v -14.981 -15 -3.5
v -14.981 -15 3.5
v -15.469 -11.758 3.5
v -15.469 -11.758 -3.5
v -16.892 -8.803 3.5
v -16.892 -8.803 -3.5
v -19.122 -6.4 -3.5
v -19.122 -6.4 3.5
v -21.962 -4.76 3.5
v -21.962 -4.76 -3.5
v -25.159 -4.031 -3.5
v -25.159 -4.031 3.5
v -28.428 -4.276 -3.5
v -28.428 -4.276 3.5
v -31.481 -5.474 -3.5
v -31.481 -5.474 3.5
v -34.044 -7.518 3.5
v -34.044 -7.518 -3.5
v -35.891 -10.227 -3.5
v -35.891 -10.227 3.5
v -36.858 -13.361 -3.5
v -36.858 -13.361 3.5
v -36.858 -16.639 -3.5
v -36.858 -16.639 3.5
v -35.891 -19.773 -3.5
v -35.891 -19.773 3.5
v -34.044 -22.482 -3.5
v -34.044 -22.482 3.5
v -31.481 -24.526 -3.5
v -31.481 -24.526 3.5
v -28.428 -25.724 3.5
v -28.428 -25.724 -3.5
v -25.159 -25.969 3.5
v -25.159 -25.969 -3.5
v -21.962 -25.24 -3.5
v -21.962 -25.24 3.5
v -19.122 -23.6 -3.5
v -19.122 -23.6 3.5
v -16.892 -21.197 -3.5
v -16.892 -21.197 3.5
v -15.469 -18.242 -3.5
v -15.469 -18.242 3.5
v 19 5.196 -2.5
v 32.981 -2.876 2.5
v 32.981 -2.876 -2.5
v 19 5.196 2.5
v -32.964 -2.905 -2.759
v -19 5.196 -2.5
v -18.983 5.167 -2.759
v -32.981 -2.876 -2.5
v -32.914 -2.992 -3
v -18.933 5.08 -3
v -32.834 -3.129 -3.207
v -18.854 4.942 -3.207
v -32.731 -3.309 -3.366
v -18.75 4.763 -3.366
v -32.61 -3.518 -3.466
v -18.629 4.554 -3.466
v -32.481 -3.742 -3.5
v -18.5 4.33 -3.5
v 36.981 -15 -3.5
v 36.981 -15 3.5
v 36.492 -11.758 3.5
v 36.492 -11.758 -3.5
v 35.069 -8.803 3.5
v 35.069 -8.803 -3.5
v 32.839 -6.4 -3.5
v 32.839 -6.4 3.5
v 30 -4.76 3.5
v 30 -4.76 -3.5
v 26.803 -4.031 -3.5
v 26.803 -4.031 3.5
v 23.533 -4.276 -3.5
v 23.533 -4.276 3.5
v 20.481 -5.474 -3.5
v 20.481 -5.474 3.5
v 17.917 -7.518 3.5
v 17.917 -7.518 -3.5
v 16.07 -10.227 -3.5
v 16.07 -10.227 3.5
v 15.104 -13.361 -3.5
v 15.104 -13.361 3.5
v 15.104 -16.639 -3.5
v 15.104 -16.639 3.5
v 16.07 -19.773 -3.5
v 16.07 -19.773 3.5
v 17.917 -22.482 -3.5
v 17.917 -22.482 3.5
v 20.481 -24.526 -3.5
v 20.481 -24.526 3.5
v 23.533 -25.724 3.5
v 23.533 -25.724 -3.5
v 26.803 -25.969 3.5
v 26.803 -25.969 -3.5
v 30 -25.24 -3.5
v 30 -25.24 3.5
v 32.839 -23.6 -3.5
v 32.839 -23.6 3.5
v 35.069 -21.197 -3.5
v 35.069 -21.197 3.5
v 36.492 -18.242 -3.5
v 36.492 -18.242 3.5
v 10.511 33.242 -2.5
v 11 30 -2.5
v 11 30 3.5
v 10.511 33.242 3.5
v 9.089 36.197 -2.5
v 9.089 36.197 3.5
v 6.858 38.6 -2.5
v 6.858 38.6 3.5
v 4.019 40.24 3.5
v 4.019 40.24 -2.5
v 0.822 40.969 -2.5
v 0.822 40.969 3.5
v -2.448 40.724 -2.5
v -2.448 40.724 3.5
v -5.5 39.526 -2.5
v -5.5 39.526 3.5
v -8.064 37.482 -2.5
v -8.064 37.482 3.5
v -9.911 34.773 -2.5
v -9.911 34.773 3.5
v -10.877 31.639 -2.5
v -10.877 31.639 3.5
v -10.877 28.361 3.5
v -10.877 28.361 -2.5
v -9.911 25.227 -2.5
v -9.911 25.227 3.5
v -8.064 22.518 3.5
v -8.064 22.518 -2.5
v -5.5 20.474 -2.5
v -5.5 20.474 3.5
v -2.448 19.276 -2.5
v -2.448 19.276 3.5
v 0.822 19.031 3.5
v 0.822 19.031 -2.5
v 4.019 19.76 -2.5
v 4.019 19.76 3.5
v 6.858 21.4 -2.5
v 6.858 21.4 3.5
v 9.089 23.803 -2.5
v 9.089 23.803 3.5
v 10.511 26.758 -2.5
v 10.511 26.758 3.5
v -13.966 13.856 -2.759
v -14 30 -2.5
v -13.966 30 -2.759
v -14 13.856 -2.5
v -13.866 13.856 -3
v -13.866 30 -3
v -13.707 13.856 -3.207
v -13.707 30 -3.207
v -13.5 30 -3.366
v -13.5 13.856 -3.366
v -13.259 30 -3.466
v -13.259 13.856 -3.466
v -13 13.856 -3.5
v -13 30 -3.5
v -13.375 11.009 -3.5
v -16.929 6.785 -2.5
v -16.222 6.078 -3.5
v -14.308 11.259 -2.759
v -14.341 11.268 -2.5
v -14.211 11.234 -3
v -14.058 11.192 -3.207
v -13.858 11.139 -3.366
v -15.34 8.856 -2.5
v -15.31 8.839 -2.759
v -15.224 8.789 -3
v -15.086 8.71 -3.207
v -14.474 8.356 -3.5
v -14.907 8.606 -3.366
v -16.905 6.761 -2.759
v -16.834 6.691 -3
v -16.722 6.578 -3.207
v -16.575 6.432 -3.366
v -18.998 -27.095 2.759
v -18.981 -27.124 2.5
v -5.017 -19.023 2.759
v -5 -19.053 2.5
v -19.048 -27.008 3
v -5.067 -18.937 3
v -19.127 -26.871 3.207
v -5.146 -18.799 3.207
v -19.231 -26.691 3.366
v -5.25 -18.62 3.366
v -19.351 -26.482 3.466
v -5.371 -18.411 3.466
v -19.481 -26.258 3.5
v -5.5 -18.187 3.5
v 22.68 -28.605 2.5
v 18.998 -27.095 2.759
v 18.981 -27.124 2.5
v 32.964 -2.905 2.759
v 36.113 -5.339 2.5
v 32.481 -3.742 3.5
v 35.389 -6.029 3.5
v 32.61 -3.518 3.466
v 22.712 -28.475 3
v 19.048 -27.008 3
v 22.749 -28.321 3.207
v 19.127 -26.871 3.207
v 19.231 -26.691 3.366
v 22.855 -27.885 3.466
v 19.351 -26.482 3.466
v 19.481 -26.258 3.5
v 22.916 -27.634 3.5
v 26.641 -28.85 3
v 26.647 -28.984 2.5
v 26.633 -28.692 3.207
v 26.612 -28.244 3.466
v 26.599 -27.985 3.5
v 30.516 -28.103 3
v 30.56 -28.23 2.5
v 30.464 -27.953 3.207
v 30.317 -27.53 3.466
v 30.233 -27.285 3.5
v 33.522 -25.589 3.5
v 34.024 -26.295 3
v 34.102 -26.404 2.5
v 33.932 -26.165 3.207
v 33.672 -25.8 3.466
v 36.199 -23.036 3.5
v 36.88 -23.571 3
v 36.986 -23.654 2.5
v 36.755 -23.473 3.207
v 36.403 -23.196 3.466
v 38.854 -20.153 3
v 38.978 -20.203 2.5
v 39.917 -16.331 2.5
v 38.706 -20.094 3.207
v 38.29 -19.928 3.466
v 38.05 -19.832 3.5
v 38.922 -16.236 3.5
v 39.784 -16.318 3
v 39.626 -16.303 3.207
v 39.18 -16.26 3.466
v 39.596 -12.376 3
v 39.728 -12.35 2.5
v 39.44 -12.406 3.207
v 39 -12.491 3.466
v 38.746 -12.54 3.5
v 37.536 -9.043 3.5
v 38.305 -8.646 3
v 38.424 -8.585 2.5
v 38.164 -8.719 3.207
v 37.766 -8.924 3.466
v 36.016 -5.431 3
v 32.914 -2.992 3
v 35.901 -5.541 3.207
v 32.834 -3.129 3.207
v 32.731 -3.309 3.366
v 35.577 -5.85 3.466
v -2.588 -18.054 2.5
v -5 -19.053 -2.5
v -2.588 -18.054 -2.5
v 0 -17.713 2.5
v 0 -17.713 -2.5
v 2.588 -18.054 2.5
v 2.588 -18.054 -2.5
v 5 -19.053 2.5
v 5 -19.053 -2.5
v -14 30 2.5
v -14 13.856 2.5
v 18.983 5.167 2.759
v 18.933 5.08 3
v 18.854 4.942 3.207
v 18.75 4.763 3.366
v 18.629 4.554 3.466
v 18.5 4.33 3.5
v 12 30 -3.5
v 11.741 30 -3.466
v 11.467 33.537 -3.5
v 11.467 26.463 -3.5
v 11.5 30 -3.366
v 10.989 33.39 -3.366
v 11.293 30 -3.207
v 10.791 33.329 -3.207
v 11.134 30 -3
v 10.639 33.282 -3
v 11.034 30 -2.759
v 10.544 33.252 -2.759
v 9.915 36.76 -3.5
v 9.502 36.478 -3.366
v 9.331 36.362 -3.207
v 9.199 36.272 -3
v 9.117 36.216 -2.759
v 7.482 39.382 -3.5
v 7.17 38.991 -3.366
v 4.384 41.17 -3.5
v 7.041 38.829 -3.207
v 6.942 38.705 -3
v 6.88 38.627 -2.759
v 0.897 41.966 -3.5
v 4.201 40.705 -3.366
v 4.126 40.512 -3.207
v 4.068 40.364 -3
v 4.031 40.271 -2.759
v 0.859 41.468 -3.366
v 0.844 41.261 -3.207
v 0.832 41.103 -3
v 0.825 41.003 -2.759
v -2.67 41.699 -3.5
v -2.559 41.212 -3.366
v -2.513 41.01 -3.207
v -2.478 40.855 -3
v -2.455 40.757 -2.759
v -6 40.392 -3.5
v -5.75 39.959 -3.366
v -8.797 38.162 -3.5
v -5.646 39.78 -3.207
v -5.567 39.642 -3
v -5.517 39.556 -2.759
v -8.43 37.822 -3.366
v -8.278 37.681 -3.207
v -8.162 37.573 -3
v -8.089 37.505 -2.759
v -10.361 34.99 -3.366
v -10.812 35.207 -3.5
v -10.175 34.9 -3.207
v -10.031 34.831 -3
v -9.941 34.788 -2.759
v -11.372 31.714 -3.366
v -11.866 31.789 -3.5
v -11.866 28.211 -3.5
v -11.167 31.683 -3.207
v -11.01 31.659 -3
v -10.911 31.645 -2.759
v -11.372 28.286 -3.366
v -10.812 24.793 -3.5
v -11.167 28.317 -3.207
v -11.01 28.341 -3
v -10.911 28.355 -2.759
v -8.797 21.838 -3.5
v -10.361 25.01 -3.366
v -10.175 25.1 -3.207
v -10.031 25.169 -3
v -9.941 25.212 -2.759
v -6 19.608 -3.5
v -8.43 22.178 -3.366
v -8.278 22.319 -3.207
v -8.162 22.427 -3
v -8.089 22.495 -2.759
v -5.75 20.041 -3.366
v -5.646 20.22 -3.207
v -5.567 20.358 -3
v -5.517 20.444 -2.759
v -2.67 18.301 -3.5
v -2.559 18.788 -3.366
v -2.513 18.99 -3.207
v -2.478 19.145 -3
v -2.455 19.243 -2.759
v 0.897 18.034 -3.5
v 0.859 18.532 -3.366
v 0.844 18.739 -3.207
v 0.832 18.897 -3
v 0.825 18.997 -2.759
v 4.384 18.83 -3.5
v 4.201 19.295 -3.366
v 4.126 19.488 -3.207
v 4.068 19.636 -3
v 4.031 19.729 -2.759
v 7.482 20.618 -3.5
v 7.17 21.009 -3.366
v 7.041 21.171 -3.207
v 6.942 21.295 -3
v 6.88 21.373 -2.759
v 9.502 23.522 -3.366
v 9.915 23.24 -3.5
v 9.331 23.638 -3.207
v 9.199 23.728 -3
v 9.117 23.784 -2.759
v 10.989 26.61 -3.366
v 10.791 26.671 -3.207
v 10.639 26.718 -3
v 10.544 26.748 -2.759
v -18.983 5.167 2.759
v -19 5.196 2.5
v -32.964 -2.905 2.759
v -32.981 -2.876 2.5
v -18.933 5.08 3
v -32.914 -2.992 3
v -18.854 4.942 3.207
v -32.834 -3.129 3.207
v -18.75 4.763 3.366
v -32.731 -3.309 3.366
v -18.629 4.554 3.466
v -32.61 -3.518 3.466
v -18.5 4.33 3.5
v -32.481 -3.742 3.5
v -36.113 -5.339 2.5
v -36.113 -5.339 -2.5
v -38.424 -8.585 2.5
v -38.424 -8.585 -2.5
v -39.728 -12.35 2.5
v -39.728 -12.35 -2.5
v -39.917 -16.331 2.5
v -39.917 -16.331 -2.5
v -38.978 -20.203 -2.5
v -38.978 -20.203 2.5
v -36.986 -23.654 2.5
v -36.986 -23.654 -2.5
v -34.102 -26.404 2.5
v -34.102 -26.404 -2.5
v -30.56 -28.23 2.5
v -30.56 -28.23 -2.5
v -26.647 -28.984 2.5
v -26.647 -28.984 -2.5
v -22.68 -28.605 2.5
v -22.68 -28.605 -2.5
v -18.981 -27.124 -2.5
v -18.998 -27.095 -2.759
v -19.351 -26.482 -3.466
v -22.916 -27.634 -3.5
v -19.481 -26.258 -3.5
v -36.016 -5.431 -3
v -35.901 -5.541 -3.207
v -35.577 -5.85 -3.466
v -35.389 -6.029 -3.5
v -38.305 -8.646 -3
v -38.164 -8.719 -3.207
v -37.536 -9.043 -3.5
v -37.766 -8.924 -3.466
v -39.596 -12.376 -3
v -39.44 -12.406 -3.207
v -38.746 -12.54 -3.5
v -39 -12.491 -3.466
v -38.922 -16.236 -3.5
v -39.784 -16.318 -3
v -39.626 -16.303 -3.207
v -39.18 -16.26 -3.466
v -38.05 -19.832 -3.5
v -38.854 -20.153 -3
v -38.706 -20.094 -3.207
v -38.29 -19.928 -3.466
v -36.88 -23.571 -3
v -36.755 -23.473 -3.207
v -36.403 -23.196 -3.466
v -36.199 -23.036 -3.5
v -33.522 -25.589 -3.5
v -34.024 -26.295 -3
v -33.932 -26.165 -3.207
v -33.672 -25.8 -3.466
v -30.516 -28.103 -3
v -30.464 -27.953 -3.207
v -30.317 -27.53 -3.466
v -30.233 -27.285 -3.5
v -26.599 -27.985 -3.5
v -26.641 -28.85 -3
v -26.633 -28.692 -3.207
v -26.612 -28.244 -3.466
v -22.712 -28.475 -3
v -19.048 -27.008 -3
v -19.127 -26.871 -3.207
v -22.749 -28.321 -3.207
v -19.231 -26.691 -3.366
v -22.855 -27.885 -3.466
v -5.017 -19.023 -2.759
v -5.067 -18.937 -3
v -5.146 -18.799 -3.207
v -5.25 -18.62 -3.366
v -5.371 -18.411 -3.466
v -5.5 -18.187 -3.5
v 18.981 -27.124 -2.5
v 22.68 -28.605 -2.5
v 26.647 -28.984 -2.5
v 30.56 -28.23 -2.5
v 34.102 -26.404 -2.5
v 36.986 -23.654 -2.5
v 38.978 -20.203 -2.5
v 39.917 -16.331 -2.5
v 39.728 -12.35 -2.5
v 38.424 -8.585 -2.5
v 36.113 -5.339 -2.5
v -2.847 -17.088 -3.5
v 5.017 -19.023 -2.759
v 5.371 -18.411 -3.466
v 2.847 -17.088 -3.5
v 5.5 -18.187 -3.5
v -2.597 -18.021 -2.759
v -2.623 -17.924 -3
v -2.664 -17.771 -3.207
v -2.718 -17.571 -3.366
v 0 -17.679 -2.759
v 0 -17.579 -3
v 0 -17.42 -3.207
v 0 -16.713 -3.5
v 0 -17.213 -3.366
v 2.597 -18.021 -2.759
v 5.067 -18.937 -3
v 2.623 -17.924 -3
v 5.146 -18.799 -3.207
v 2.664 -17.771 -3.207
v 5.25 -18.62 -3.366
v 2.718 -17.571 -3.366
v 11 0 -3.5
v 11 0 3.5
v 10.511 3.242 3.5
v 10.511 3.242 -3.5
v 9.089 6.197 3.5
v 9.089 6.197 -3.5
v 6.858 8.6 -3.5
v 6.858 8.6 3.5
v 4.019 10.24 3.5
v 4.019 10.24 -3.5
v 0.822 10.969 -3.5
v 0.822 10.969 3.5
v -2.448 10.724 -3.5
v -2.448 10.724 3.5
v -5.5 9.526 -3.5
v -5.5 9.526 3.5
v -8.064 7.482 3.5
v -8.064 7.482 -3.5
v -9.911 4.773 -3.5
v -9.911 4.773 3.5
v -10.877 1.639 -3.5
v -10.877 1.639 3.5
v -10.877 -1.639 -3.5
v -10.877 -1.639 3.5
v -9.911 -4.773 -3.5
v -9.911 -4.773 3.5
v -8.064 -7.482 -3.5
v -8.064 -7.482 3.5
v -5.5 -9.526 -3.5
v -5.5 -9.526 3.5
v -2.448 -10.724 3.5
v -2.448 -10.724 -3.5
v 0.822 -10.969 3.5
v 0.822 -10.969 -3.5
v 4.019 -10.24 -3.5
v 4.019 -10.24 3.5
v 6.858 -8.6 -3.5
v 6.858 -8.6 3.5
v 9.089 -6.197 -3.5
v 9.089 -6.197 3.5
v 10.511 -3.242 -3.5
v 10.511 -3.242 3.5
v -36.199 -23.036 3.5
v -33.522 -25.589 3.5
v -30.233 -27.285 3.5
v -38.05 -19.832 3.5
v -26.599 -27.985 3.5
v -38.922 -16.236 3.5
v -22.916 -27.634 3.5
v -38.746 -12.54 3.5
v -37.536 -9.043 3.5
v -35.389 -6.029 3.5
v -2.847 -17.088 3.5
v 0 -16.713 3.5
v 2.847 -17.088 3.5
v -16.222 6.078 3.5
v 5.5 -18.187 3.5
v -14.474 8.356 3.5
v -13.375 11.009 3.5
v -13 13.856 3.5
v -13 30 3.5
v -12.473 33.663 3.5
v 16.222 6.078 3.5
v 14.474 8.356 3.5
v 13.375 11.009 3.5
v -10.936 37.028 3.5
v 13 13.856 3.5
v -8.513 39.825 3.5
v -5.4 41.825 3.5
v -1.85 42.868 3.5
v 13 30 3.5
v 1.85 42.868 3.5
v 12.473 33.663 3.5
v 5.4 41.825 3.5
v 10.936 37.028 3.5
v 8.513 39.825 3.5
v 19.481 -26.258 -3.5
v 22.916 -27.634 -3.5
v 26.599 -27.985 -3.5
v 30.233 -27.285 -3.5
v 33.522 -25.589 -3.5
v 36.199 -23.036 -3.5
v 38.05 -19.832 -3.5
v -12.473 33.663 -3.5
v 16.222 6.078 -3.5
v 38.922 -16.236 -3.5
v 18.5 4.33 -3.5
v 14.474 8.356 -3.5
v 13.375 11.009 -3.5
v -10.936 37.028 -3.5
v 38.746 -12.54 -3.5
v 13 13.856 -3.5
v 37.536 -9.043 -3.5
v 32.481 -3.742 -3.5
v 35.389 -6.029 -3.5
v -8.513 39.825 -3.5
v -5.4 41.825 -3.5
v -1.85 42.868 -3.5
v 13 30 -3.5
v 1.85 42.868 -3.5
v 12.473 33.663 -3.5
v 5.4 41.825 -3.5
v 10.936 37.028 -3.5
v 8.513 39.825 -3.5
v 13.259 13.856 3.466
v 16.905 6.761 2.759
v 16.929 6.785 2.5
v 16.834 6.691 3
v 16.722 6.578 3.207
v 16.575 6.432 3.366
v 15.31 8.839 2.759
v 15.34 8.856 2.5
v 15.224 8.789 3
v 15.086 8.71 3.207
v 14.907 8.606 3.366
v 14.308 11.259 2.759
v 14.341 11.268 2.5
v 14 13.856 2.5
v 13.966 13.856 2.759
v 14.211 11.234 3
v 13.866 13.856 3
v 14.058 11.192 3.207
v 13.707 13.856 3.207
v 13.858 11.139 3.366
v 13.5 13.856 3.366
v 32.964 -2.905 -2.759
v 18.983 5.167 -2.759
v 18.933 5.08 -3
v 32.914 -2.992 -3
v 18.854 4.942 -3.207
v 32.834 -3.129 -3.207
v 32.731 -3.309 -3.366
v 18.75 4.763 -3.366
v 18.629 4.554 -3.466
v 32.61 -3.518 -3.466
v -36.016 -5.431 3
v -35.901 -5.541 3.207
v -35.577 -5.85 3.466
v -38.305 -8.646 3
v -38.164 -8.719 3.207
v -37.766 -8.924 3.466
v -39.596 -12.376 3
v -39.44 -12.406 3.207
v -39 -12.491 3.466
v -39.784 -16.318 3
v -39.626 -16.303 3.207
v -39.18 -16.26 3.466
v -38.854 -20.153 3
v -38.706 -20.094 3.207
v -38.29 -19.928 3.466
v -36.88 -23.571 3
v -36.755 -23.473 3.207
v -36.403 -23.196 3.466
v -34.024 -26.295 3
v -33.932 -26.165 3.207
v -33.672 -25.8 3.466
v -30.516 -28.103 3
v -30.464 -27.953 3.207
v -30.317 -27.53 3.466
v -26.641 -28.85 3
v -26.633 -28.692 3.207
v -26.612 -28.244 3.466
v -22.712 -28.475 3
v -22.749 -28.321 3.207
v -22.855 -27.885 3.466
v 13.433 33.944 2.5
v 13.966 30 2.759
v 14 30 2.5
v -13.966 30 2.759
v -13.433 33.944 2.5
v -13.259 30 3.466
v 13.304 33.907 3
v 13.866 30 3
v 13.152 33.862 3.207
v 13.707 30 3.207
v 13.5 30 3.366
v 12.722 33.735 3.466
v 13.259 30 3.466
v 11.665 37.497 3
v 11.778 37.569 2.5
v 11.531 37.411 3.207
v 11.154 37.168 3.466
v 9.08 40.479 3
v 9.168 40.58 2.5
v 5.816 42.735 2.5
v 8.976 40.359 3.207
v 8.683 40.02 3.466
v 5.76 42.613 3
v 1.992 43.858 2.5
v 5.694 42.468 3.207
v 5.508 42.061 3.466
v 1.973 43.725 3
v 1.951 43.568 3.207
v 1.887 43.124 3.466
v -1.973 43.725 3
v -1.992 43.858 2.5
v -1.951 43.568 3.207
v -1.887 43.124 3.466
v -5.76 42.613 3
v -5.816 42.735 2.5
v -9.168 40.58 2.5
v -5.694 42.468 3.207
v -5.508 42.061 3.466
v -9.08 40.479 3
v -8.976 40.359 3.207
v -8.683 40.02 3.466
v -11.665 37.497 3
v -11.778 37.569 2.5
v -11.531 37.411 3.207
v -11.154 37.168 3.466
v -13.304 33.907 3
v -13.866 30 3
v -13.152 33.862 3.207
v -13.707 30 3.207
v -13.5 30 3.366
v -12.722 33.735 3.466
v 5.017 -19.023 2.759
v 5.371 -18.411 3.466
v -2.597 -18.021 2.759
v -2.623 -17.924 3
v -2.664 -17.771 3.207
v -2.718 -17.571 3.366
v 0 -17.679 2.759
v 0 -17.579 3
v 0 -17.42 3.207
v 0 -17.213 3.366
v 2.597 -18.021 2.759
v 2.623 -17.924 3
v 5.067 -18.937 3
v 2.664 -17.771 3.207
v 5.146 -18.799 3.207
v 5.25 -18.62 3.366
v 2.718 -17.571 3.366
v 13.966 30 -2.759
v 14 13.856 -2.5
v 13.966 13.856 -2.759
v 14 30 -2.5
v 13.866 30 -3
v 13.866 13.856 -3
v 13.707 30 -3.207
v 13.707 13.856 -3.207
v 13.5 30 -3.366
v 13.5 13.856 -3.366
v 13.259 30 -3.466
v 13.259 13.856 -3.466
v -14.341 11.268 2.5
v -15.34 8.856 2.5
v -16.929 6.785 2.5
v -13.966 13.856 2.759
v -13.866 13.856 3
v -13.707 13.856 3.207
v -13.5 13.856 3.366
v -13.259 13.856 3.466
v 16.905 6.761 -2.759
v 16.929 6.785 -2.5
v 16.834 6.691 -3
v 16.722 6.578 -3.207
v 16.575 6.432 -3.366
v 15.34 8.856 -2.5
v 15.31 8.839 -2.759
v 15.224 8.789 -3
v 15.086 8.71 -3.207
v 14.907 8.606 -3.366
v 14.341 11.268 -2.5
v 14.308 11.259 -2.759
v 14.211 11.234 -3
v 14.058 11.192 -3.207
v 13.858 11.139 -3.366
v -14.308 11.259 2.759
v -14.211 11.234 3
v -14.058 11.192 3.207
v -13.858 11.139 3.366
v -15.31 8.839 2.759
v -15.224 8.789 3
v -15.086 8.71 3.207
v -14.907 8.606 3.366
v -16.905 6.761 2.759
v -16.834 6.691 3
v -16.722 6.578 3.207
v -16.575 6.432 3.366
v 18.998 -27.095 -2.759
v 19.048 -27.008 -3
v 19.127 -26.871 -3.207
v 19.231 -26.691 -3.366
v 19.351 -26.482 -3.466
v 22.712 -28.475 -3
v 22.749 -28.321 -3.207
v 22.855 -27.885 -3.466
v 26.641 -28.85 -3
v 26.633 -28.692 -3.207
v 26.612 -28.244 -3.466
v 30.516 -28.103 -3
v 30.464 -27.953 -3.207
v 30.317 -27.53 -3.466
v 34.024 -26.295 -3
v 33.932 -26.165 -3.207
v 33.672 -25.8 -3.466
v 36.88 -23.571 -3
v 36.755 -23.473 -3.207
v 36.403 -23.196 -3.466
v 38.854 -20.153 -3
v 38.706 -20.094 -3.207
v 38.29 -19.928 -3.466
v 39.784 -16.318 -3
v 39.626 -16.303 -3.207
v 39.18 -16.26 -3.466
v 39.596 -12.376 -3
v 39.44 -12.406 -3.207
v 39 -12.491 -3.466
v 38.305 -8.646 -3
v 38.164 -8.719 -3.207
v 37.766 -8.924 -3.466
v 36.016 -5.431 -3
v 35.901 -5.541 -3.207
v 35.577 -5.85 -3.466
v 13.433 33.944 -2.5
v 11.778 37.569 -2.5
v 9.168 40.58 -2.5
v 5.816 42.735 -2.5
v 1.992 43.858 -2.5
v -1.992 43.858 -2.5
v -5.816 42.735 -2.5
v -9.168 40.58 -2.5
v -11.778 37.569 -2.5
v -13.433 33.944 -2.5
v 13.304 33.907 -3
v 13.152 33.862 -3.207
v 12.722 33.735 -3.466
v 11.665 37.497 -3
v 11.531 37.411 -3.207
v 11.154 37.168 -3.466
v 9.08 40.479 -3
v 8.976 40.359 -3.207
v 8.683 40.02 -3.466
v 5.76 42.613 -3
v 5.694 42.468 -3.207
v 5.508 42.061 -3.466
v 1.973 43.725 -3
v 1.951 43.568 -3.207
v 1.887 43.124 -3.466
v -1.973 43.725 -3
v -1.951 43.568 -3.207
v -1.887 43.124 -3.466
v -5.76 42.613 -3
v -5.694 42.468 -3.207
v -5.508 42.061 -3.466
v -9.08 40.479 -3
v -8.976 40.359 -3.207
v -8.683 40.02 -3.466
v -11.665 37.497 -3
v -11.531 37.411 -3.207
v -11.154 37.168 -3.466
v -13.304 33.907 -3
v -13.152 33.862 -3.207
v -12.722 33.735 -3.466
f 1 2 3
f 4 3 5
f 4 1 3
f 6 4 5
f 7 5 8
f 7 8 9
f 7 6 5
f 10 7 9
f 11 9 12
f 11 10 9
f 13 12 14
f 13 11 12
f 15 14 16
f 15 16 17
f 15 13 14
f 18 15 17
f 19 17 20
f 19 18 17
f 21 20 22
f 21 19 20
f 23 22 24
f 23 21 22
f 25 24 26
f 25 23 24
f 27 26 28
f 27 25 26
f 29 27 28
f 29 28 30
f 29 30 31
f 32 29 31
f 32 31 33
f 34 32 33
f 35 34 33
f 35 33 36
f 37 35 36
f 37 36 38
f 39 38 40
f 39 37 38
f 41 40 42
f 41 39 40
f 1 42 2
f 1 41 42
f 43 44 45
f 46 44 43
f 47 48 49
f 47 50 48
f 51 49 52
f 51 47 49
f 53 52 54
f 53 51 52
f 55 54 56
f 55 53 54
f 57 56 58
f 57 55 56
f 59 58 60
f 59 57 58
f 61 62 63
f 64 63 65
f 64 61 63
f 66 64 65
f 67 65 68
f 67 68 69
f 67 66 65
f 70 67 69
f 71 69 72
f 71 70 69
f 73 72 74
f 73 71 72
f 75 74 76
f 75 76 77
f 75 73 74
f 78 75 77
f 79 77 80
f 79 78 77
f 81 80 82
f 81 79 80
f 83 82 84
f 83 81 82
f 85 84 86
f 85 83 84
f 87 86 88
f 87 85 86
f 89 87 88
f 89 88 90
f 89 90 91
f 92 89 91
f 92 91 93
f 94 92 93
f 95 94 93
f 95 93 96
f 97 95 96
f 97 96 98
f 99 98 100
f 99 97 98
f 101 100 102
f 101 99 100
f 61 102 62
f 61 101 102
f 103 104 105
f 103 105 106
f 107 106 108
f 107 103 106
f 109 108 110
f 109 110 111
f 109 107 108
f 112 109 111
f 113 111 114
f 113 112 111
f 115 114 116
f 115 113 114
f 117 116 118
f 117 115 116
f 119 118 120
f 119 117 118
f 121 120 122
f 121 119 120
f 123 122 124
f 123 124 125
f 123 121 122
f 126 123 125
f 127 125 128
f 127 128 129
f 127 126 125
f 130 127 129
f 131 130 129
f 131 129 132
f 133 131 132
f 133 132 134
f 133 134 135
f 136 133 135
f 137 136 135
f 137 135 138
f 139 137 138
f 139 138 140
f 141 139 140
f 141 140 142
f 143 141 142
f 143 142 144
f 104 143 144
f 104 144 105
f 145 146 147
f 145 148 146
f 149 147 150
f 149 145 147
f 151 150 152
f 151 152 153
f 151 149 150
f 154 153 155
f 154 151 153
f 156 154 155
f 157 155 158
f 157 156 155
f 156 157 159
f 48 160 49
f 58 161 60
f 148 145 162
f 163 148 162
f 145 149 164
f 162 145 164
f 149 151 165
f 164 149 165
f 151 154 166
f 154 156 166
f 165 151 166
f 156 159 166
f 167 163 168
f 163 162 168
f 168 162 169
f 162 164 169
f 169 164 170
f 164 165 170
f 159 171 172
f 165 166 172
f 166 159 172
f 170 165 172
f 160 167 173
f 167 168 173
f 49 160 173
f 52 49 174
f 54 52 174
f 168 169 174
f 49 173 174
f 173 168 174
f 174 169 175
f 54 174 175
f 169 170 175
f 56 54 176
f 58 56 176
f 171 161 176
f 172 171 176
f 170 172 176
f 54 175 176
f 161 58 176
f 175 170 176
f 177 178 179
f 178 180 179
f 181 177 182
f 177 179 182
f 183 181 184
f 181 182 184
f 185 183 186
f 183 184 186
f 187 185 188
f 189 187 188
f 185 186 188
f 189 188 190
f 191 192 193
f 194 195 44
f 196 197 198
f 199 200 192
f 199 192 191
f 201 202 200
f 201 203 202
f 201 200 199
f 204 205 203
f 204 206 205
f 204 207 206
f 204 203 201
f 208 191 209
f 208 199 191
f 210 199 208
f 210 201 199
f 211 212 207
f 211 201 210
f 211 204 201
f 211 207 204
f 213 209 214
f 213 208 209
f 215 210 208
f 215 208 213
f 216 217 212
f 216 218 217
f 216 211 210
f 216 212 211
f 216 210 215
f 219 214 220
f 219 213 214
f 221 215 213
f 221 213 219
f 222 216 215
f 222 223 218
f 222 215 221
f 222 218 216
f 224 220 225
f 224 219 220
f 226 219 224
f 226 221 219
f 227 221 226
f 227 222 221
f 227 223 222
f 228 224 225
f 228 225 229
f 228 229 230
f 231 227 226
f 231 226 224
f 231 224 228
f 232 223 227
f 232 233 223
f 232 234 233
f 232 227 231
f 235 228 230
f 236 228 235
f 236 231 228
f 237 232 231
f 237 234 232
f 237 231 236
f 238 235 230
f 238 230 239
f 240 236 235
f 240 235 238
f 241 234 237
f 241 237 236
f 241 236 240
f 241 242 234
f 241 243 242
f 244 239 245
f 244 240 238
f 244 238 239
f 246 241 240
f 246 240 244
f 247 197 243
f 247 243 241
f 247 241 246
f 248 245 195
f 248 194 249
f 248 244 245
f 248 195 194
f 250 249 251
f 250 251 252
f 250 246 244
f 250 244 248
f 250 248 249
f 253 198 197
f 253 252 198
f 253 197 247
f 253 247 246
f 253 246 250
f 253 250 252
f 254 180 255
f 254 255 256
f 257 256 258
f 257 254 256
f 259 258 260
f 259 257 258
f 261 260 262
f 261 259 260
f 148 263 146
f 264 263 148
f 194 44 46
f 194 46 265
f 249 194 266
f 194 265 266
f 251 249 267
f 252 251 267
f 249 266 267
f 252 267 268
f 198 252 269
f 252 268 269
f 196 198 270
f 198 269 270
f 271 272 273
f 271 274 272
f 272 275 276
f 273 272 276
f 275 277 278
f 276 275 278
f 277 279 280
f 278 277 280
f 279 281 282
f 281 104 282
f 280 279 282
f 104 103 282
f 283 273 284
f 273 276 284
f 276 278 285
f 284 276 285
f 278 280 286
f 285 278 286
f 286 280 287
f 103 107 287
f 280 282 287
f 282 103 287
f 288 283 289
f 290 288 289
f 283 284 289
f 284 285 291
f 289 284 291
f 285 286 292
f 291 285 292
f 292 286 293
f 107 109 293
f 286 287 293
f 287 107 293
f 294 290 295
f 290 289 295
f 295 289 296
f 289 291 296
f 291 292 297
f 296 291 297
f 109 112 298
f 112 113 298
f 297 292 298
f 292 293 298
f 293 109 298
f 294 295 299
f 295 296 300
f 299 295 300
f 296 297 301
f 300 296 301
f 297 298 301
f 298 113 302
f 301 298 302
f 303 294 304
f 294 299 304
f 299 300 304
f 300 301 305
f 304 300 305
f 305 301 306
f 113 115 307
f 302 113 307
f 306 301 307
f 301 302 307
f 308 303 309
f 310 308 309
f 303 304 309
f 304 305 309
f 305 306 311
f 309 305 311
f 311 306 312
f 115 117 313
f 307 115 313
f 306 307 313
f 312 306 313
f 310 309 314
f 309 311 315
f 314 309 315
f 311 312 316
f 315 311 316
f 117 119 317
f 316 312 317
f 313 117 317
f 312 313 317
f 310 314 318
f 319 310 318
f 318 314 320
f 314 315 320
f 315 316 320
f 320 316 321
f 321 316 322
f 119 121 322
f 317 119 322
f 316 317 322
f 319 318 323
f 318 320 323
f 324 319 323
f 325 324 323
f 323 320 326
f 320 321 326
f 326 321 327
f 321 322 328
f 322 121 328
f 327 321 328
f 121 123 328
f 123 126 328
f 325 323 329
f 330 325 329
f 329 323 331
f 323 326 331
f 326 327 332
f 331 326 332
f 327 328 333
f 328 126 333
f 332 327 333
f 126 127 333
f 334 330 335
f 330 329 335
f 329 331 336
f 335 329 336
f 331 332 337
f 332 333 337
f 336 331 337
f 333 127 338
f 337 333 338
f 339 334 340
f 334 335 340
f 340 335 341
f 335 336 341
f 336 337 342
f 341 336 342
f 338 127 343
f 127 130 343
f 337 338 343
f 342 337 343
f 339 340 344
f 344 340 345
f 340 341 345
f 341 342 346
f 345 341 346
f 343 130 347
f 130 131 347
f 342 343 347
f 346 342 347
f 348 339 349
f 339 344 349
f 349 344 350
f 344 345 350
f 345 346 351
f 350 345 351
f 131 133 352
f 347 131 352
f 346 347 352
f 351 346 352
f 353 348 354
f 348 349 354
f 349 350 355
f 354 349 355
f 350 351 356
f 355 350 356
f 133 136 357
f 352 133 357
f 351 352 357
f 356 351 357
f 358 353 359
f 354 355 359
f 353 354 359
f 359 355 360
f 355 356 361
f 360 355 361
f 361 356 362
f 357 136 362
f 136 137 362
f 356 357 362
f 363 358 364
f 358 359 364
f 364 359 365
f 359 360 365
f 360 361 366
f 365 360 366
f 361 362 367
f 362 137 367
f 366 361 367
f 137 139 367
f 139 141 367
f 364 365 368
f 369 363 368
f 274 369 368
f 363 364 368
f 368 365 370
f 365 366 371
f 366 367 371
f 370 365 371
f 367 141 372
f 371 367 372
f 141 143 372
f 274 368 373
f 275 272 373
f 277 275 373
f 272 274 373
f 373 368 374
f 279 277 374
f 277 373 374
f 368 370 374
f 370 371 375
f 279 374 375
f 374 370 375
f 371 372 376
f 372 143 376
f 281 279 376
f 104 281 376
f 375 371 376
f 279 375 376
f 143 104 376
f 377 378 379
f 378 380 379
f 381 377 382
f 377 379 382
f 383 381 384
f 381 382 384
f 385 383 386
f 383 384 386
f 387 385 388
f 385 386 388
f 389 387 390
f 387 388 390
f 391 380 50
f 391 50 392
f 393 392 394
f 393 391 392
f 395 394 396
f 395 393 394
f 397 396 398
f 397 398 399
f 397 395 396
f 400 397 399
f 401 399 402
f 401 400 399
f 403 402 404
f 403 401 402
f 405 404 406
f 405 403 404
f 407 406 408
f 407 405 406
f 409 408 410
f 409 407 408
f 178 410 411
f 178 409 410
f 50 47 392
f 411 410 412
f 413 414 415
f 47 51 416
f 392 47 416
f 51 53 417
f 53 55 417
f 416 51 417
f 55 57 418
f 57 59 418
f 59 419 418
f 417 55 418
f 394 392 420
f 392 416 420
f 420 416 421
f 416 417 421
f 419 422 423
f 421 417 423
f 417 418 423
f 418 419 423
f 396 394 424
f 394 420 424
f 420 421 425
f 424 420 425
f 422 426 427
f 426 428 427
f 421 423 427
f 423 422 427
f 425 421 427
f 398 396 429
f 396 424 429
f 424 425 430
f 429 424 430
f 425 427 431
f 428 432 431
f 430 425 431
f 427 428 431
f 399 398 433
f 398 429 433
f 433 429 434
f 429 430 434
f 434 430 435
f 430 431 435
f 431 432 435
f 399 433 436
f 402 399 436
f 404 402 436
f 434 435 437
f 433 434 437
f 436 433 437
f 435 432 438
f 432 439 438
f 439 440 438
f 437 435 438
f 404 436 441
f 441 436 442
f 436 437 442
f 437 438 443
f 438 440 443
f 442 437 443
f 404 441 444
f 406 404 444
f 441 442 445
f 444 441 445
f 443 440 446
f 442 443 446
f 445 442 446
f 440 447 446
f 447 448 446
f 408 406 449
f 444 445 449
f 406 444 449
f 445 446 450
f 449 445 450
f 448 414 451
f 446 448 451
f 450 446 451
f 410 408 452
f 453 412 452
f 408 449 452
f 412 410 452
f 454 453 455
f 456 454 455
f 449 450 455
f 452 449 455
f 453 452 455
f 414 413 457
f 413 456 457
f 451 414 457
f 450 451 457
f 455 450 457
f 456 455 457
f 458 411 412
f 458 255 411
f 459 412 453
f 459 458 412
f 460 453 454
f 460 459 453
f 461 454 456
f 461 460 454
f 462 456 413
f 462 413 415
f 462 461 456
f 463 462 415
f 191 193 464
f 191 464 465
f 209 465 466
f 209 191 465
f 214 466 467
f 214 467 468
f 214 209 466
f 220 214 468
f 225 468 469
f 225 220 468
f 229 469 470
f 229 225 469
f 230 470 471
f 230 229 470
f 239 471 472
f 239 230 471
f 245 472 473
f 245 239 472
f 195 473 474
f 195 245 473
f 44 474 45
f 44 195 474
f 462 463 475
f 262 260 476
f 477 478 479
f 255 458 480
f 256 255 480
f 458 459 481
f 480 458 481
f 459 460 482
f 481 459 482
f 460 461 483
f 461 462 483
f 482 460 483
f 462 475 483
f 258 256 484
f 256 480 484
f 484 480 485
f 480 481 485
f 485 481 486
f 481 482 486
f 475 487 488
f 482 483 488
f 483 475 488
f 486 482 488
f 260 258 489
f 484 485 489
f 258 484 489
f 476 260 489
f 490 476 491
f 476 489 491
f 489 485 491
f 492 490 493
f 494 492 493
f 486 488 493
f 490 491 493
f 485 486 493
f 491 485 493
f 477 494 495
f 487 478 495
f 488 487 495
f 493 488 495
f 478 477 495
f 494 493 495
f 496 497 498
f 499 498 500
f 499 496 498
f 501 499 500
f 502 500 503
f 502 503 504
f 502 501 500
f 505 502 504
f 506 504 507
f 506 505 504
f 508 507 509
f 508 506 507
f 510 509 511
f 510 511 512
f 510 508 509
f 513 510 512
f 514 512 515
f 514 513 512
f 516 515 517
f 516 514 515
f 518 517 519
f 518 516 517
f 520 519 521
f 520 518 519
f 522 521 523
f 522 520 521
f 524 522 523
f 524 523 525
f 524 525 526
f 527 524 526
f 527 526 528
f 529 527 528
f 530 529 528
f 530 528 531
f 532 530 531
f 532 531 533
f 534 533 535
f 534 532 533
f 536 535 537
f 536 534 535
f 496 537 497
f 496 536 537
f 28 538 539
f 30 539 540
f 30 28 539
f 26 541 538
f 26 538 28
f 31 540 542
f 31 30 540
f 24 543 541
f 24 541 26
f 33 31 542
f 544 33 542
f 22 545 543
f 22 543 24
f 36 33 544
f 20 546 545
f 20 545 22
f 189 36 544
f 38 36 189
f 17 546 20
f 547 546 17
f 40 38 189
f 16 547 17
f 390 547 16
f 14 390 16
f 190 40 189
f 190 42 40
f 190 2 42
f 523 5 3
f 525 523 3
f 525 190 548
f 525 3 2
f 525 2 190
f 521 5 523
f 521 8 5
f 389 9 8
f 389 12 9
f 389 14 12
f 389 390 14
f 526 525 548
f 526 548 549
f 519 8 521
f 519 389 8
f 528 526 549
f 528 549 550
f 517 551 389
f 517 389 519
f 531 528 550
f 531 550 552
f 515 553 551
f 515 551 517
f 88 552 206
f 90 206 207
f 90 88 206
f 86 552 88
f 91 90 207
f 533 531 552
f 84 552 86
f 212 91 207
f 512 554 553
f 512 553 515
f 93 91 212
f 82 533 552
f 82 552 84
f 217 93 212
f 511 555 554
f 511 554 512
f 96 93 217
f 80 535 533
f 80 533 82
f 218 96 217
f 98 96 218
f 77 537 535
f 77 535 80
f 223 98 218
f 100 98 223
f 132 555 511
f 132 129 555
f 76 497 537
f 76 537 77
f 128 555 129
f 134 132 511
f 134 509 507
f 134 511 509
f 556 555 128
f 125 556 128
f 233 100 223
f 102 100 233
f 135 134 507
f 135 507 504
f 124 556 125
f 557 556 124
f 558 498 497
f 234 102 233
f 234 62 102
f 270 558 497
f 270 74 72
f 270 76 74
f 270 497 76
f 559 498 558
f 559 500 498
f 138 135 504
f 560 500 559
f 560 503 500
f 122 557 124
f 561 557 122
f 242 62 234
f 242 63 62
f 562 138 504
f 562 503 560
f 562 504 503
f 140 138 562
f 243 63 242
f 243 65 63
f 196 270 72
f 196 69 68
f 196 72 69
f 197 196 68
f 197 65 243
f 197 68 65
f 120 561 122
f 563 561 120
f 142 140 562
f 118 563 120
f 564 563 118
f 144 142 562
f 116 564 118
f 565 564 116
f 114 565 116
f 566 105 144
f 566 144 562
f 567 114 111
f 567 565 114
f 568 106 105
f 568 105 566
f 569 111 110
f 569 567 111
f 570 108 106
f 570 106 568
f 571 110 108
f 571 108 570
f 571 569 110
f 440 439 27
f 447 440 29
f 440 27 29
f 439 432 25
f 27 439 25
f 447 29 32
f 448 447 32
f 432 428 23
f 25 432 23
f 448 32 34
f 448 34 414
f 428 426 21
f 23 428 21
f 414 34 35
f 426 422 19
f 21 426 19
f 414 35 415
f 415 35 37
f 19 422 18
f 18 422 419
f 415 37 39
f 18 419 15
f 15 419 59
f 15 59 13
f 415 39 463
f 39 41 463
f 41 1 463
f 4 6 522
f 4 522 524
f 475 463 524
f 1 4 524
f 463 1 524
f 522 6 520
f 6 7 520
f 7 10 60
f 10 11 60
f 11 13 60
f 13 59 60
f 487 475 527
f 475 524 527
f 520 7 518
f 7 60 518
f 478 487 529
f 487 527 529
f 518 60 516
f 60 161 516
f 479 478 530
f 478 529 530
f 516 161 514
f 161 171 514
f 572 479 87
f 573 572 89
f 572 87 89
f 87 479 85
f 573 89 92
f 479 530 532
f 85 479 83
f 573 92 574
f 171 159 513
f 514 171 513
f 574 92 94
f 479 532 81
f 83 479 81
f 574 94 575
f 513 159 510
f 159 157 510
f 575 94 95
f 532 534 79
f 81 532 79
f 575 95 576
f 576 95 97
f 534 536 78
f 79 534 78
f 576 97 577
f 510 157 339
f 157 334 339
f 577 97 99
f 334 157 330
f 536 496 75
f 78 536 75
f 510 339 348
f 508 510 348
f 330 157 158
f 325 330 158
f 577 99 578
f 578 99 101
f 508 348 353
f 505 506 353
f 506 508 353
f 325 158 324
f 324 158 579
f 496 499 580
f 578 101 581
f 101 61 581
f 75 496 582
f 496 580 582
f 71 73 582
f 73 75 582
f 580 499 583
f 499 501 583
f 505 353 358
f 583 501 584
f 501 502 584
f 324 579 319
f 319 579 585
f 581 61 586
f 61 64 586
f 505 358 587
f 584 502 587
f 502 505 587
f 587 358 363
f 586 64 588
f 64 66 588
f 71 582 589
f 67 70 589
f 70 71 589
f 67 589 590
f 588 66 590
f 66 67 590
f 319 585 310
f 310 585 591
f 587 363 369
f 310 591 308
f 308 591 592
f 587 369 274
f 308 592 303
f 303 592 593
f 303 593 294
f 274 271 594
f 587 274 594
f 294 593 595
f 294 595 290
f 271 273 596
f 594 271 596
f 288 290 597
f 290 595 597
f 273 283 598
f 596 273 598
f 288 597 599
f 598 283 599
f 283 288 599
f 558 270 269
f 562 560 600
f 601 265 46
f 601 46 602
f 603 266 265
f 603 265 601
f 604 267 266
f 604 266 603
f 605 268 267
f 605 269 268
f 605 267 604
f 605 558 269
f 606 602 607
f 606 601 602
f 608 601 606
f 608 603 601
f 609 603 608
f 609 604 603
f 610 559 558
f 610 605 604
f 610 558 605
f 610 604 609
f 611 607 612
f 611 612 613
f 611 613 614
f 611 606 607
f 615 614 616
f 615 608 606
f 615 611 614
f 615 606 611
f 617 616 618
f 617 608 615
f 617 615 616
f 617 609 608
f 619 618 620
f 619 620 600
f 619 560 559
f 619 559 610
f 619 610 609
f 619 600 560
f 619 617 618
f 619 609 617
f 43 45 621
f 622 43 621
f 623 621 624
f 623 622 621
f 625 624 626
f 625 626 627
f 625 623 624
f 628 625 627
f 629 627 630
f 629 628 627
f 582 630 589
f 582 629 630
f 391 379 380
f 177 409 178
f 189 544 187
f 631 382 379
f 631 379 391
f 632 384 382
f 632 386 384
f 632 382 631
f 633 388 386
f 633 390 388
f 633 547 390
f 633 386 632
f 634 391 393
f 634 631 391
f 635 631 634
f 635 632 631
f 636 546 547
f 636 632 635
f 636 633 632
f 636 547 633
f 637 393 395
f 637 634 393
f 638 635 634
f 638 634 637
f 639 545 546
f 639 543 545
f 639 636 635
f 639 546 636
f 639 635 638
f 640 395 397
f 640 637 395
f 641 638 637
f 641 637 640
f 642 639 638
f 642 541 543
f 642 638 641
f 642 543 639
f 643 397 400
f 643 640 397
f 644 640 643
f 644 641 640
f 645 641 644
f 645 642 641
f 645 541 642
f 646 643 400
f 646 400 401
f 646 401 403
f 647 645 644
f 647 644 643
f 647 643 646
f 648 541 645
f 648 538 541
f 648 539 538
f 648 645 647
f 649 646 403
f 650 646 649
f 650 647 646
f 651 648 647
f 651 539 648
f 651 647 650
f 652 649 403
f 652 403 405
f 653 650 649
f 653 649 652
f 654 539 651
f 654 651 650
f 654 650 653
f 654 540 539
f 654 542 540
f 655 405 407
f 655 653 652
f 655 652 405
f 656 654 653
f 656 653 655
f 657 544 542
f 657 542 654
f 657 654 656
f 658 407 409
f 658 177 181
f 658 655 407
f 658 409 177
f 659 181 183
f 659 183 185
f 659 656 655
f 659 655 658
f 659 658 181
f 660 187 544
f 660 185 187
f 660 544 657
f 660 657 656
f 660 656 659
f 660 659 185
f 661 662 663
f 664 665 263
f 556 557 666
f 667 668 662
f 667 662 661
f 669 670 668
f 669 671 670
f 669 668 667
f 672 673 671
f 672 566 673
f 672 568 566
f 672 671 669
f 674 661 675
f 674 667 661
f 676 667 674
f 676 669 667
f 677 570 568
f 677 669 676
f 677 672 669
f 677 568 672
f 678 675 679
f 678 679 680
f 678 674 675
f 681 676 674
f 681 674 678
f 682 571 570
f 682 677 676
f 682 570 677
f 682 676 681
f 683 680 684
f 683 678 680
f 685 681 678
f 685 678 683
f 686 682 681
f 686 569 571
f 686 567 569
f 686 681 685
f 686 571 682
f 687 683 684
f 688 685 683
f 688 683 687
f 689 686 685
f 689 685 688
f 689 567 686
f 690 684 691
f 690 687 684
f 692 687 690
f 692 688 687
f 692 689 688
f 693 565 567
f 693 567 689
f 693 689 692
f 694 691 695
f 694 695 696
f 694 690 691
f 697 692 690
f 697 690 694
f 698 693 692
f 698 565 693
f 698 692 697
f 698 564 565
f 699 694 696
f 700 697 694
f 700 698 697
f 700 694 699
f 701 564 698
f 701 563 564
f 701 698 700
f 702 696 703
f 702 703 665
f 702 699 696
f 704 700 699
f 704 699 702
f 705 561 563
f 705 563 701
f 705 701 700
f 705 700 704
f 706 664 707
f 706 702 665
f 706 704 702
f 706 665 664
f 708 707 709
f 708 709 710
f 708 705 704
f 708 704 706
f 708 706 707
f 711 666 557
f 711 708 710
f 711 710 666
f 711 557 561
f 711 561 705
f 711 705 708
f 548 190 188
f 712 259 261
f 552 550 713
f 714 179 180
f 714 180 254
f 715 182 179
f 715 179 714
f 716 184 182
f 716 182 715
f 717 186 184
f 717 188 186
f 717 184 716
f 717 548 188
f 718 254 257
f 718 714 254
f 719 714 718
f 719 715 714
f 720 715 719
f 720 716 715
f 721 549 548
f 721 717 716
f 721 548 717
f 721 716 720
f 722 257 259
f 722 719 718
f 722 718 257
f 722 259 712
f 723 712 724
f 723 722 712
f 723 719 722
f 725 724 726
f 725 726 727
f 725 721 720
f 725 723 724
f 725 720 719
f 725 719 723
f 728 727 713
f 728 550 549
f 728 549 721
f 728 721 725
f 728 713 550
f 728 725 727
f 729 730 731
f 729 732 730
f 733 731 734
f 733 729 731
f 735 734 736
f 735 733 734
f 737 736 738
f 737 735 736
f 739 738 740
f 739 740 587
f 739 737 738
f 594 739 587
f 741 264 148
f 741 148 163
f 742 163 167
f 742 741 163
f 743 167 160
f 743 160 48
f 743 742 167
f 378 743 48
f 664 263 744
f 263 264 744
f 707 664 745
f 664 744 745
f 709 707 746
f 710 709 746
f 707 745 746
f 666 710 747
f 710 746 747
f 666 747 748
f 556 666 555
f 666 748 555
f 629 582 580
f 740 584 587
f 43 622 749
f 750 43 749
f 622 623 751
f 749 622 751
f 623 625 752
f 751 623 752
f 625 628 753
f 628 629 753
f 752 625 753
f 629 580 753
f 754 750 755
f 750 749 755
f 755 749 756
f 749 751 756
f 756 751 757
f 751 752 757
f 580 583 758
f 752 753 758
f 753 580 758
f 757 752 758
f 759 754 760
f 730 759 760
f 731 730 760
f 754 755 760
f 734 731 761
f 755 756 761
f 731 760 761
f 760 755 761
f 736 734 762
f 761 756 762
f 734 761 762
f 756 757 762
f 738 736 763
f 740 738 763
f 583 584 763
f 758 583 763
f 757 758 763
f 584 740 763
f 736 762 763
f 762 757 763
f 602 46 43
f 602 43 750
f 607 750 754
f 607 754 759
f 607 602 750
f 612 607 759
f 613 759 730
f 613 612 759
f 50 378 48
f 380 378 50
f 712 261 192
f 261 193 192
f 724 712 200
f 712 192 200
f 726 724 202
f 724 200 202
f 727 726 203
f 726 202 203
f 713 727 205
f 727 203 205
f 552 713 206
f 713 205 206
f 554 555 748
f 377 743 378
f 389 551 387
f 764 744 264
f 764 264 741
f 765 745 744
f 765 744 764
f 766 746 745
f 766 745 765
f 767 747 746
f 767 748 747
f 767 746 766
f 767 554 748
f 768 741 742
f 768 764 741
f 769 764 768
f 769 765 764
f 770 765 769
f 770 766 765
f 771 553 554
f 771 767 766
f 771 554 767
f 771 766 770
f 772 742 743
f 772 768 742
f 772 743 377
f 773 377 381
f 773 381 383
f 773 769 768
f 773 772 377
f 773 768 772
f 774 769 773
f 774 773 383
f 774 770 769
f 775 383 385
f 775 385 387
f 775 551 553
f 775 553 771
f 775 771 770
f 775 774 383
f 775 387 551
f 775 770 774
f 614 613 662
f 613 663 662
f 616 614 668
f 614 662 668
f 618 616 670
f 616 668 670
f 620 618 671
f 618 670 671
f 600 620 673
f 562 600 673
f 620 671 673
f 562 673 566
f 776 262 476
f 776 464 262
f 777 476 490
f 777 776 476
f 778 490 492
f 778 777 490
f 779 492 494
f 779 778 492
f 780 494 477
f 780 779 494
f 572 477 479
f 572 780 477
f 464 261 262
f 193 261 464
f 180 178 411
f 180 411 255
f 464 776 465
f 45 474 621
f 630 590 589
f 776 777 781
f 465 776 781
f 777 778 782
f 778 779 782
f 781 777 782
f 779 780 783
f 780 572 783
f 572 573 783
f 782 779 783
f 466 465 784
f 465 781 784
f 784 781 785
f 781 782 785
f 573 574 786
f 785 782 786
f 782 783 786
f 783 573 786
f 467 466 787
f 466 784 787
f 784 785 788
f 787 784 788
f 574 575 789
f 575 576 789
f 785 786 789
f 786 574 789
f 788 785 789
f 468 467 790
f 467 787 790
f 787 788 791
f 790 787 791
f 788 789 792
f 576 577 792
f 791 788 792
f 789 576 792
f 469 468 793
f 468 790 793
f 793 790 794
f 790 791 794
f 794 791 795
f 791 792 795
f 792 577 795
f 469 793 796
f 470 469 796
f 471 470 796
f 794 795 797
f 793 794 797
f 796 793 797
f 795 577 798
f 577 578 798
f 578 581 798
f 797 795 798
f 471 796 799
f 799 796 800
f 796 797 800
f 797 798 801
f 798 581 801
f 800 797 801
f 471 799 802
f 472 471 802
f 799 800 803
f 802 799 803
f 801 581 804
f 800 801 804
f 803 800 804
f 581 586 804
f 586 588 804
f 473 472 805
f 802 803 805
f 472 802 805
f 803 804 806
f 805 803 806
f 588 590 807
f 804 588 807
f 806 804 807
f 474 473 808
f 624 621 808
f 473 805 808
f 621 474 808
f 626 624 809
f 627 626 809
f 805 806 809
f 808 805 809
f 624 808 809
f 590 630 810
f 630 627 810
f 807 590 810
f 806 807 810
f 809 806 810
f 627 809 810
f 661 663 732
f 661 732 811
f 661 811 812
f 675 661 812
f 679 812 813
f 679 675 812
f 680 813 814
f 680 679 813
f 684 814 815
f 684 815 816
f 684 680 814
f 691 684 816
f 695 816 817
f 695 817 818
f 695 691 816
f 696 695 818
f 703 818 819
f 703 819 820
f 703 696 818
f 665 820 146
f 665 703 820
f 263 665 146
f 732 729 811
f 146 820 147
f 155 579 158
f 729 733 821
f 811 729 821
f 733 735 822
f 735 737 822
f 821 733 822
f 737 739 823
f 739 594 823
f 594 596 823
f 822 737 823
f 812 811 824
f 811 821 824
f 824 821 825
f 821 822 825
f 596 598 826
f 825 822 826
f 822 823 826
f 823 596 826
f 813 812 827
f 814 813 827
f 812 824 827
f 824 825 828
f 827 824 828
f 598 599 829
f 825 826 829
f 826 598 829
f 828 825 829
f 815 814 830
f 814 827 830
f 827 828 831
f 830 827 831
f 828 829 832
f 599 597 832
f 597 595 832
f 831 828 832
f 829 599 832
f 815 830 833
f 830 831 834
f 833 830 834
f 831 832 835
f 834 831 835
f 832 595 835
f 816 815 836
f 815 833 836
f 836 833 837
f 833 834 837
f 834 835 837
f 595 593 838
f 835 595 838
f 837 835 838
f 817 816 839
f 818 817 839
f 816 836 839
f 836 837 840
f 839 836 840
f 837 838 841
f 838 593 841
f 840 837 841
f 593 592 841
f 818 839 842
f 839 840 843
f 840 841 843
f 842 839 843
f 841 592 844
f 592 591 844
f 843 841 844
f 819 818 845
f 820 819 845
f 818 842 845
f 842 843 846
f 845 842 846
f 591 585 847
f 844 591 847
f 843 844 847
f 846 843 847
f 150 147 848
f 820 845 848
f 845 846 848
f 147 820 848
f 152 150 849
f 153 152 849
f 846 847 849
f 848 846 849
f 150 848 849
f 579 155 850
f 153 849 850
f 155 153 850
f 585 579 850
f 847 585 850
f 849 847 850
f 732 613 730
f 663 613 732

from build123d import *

# Parameters (mm, degrees)
F0_R     = 11
F1_DEPTH = 3.5
F2_R     = 1
F3_R     = 1


with BuildPart() as f1:
    # F0 (on Top) → F1 (new body, symmetric)
    with BuildSketch(Plane.XY):
        with BuildLine():
            ThreePointArc((-32.980762, -2.875644), (-38.105118, -22), (-18.980762, -27.124356))
            Line((-18.980762, -27.124356), (-5, -19.052559))
            ThreePointArc((-5, -19.052559), (0, -17.712813), (5, -19.052559))
            Line((5, -19.052559), (18.980762, -27.124356))
            ThreePointArc((18.980762, -27.124356), (38.105118, -22), (32.980762, -2.875644))
            Line((32.980762, -2.875644), (19, 5.196152))
            ThreePointArc((19, 5.196152), (15.339746, 8.856406), (14, 13.856406))
            Line((14, 13.856406), (14, 30))
            ThreePointArc((14, 30), (0, 44), (-14, 30))
            Line((-14, 30), (-14, 13.856406))
            ThreePointArc((-14, 13.856406), (-15.339746, 8.856406), (-19, 5.196152))
            Line((-19, 5.196152), (-32.980762, -2.875644))
        make_face()
        with Locations((-25.980762, -15)):
            Circle(F0_R, mode=Mode.SUBTRACT)
        Circle(F0_R, mode=Mode.SUBTRACT)
        with Locations((25.980762, -15)):
            Circle(F0_R, mode=Mode.SUBTRACT)
        with Locations((0, 30)):
            Circle(F0_R, mode=Mode.SUBTRACT)
    extrude(amount=F1_DEPTH, both=True)

    # F2
    f2_edges = [f1.edges().sort_by_distance(p)[0] for p in [
        (0, 44, 3.5),
        (14, 21.928203, 3.5),
        (15.339746, 8.856406, 3.5),
        (25.990381, 1.160254, 3.5),
        (38.105118, -22, 3.5),
        (11.990381, -23.088457, 3.5),
        (0, -17.712813, 3.5),
        (-11.990381, -23.088457, 3.5),
        (-38.105118, -22, 3.5),
        (-25.990381, 1.160254, 3.5),
        (-15.339746, 8.856406, 3.5),
        (-14, 21.928203, 3.5),
    ]]
    fillet(f2_edges, radius=F2_R)

    # F3
    f3_edges = [f1.edges().sort_by_distance(p)[0] for p in [
        (-11.990381, -23.088457, -3.5),
        (-38.105118, -22, -3.5),
        (-25.990381, 1.160254, -3.5),
        (-15.339746, 8.856406, -3.5),
        (-14, 21.928203, -3.5),
        (-11, 30, -3.5),
        (14, 21.928203, -3.5),
        (15.339746, 8.856406, -3.5),
        (25.990381, 1.160254, -3.5),
        (38.105118, -22, -3.5),
        (11.990381, -23.088457, -3.5),
        (0, -17.712813, -3.5),
    ]]
    fillet(f3_edges, radius=F3_R)


solid = f1.part
